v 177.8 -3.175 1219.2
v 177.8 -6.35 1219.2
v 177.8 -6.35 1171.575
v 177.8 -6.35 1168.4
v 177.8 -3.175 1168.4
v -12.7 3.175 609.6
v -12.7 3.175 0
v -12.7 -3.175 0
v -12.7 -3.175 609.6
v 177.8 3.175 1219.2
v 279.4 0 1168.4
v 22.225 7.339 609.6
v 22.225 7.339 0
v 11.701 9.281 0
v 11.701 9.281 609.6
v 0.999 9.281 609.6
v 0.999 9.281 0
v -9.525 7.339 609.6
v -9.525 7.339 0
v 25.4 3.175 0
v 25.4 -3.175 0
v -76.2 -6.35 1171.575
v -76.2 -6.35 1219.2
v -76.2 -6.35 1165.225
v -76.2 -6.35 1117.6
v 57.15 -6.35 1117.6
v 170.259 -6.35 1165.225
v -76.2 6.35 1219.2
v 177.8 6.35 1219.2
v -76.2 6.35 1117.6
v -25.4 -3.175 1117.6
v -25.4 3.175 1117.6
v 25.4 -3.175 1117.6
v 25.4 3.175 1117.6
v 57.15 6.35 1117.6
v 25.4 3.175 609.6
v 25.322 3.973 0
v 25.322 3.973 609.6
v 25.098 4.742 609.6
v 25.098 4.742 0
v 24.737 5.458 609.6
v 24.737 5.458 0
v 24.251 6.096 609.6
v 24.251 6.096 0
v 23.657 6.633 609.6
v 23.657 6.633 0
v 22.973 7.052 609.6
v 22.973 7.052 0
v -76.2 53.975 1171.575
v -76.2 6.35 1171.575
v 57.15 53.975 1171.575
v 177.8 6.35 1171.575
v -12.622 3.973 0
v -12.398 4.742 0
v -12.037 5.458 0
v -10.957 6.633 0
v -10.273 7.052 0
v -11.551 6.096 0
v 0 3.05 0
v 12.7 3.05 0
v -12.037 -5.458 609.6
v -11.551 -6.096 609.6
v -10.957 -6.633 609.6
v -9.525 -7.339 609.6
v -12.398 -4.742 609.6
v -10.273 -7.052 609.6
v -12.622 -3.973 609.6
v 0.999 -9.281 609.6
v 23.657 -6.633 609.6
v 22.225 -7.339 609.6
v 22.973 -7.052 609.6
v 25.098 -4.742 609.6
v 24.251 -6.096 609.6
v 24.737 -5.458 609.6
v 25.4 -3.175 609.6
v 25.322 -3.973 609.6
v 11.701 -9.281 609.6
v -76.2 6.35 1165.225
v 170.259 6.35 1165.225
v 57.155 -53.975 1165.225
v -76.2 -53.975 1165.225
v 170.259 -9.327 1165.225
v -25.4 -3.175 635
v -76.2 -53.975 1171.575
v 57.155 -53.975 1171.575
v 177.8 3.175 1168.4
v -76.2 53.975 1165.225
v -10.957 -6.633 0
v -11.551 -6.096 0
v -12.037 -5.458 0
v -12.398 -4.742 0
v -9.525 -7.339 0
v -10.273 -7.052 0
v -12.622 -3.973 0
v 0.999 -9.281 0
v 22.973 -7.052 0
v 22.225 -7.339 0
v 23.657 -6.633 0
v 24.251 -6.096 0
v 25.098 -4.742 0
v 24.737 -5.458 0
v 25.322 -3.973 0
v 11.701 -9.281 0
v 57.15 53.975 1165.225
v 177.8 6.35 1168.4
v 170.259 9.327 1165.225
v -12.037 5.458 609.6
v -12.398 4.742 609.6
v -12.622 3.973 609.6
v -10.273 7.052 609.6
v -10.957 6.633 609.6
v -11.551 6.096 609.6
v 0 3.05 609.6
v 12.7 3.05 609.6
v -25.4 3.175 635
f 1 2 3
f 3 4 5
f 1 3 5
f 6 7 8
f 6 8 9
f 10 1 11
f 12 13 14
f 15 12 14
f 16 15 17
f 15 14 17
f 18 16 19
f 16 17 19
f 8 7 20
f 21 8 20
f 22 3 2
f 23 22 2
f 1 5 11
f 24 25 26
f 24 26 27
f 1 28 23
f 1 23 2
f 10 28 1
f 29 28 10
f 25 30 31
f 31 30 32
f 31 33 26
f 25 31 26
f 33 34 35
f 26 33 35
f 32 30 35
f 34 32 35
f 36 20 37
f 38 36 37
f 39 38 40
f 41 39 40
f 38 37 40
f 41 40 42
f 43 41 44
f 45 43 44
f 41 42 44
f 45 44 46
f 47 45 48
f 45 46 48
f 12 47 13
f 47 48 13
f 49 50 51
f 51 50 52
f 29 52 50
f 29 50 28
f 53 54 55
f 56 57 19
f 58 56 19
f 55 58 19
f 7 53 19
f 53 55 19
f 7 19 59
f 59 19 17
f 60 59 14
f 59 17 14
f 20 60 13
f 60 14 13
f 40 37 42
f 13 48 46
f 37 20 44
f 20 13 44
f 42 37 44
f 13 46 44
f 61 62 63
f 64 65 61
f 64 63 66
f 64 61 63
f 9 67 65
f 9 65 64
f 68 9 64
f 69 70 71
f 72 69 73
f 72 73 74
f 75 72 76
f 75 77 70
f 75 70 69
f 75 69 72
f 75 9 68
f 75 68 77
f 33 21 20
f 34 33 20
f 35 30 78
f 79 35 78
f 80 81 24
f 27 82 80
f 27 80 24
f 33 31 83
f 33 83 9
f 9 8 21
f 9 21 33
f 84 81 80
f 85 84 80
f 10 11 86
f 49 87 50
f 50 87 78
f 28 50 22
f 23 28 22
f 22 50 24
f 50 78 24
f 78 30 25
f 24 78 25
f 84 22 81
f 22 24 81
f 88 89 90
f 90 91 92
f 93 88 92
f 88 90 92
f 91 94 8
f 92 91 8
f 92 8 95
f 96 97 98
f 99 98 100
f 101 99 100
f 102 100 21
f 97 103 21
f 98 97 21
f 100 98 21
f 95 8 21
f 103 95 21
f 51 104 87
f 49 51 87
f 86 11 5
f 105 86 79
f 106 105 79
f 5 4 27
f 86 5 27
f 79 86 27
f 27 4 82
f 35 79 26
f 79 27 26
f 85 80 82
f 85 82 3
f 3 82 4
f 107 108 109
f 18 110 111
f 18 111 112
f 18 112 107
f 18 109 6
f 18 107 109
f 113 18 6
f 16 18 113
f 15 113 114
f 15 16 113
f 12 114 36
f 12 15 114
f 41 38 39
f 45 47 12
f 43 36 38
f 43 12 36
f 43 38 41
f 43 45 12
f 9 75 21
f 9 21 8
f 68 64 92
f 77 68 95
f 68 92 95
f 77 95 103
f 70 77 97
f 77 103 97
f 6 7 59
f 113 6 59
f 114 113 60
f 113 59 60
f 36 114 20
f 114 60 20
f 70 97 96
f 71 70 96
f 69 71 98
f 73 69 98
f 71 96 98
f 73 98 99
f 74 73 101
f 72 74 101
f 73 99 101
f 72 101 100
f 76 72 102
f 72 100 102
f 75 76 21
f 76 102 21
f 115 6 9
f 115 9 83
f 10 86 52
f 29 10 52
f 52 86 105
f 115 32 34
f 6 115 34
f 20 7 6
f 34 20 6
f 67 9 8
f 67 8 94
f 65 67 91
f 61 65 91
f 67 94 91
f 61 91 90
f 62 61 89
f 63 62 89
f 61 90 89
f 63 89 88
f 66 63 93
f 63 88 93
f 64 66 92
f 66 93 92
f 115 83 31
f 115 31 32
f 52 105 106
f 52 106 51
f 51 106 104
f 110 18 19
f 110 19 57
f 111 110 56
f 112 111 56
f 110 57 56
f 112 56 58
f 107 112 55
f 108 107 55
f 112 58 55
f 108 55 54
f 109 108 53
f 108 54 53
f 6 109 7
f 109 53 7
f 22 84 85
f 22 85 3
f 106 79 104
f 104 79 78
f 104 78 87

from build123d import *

# Parameters (mm, degrees)
F0_W           = 50.8
F0_H           = 6.35
F1_DEPTH       = 1219.2
F3_START       = 1117.6
F3_DEPTH       = 101.6
F5_DEPTH       = 76.2
F5_DEPTH_BACK  = 76.2
F6_W           = 47.625
F6_H           = 47.625
F7_DEPTH       = 101.6
F7_DEPTH_BACK  = 254
F9_DEPTH       = 609.6
F11_DEPTH      = 25.4
F11_DEPTH_BACK = 25.4


with BuildPart() as f1:
    # F0 (on Top) → F1 (new body)
    with BuildSketch(Plane.XY):
        Rectangle(F0_W, F0_H)
    extrude(amount=F1_DEPTH)

    # F2 (on Top) → F3 (join)
    with BuildSketch(Plane.XY.offset(F3_START)):
        Polygon((57.15, 53.975), (-76.2, 53.975), (-76.2, -53.975), (57.1550797742, -53.975), (177.8, -6.35), (177.8, -3.175), (279.4, 0), (177.8, 3.175), (177.8, 6.35), align=None)
    extrude(amount=F3_DEPTH)

    # F4 (on Front) → F5 (cut, two sides)
    with BuildSketch(Plane.XZ) as f5_sk:
        Polygon((279.4, 1117.6), (279.4, 1168.4), (177.8, 1168.4), (57.15, 1117.6), align=None)
        Polygon((177.8, 1219.2), (279.4, 1168.4), (279.4, 1219.2), align=None)
    extrude(amount=-F5_DEPTH, mode=Mode.SUBTRACT)
    extrude(f5_sk.sketch, amount=F5_DEPTH_BACK, mode=Mode.SUBTRACT)

    # F6 (on Right) → F7 (cut, two sides)
    with BuildSketch(Plane.YZ) as f7_sk:
        with Locations((-30.1625, 1195.3875)):
            Rectangle(F6_W, F6_H)
        with Locations((-30.1625, 1141.4125)):
            Rectangle(F6_W, F6_H)
        with Locations((30.1625, 1141.4125)):
            Rectangle(F6_W, F6_H)
        with Locations((30.1625, 1195.3875)):
            Rectangle(F6_W, F6_H)
    extrude(amount=-F7_DEPTH, mode=Mode.SUBTRACT)
    extrude(f7_sk.sketch, amount=F7_DEPTH_BACK, mode=Mode.SUBTRACT)

    # F10 (on Front) → F11 (cut, two sides)
    with BuildSketch(Plane.XZ) as f11_sk:
        Polygon((-12.7, 0), (-12.7, 609.6), (-25.4, 635), (-25.4, 0), align=None)
    extrude(amount=-F11_DEPTH, mode=Mode.SUBTRACT)
    extrude(f11_sk.sketch, amount=F11_DEPTH_BACK, mode=Mode.SUBTRACT)


with BuildPart() as f9:
    # F8 (on Top) → F9 (new body)
    with BuildSketch(Plane.XY):
        with BuildLine():
            ThreePointArc((-9.525, 7.3390541895), (-11.8090339699, 5.7881189716), (-12.7, 3.175))
            Line((-12.7, 3.175), (25.4, 3.175))
            ThreePointArc((25.4, 3.175), (24.5090339699, 5.7881189716), (22.225, 7.3390541895))
            ThreePointArc((22.225, 7.3390541895), (6.35, 9.525), (-9.525, 7.3390541895))
        make_face()
        with BuildLine():
            Line((25.4, 3.175), (-12.7, 3.175))
            ThreePointArc((-12.7, 3.175), (6.35, 3.0338726406), (25.4, 3.175))
        make_face()
    extrude(amount=F9_DEPTH)


with BuildPart() as f9b:
    # F8 (on Top) → F9, piece 2 (new body)
    with BuildSketch(Plane.XY):
        with BuildLine():
            ThreePointArc((22.225, -7.3390541895), (24.5090339699, -5.7881189716), (25.4, -3.175))
            Line((25.4, -3.175), (-12.7, -3.175))
            ThreePointArc((-12.7, -3.175), (-11.8090339699, -5.7881189716), (-9.525, -7.3390541895))
            ThreePointArc((-9.525, -7.3390541895), (6.35, -9.525), (22.225, -7.3390541895))
        make_face()
    extrude(amount=F9_DEPTH)


solid = Compound([f1.part, f9.part, f9b.part])
